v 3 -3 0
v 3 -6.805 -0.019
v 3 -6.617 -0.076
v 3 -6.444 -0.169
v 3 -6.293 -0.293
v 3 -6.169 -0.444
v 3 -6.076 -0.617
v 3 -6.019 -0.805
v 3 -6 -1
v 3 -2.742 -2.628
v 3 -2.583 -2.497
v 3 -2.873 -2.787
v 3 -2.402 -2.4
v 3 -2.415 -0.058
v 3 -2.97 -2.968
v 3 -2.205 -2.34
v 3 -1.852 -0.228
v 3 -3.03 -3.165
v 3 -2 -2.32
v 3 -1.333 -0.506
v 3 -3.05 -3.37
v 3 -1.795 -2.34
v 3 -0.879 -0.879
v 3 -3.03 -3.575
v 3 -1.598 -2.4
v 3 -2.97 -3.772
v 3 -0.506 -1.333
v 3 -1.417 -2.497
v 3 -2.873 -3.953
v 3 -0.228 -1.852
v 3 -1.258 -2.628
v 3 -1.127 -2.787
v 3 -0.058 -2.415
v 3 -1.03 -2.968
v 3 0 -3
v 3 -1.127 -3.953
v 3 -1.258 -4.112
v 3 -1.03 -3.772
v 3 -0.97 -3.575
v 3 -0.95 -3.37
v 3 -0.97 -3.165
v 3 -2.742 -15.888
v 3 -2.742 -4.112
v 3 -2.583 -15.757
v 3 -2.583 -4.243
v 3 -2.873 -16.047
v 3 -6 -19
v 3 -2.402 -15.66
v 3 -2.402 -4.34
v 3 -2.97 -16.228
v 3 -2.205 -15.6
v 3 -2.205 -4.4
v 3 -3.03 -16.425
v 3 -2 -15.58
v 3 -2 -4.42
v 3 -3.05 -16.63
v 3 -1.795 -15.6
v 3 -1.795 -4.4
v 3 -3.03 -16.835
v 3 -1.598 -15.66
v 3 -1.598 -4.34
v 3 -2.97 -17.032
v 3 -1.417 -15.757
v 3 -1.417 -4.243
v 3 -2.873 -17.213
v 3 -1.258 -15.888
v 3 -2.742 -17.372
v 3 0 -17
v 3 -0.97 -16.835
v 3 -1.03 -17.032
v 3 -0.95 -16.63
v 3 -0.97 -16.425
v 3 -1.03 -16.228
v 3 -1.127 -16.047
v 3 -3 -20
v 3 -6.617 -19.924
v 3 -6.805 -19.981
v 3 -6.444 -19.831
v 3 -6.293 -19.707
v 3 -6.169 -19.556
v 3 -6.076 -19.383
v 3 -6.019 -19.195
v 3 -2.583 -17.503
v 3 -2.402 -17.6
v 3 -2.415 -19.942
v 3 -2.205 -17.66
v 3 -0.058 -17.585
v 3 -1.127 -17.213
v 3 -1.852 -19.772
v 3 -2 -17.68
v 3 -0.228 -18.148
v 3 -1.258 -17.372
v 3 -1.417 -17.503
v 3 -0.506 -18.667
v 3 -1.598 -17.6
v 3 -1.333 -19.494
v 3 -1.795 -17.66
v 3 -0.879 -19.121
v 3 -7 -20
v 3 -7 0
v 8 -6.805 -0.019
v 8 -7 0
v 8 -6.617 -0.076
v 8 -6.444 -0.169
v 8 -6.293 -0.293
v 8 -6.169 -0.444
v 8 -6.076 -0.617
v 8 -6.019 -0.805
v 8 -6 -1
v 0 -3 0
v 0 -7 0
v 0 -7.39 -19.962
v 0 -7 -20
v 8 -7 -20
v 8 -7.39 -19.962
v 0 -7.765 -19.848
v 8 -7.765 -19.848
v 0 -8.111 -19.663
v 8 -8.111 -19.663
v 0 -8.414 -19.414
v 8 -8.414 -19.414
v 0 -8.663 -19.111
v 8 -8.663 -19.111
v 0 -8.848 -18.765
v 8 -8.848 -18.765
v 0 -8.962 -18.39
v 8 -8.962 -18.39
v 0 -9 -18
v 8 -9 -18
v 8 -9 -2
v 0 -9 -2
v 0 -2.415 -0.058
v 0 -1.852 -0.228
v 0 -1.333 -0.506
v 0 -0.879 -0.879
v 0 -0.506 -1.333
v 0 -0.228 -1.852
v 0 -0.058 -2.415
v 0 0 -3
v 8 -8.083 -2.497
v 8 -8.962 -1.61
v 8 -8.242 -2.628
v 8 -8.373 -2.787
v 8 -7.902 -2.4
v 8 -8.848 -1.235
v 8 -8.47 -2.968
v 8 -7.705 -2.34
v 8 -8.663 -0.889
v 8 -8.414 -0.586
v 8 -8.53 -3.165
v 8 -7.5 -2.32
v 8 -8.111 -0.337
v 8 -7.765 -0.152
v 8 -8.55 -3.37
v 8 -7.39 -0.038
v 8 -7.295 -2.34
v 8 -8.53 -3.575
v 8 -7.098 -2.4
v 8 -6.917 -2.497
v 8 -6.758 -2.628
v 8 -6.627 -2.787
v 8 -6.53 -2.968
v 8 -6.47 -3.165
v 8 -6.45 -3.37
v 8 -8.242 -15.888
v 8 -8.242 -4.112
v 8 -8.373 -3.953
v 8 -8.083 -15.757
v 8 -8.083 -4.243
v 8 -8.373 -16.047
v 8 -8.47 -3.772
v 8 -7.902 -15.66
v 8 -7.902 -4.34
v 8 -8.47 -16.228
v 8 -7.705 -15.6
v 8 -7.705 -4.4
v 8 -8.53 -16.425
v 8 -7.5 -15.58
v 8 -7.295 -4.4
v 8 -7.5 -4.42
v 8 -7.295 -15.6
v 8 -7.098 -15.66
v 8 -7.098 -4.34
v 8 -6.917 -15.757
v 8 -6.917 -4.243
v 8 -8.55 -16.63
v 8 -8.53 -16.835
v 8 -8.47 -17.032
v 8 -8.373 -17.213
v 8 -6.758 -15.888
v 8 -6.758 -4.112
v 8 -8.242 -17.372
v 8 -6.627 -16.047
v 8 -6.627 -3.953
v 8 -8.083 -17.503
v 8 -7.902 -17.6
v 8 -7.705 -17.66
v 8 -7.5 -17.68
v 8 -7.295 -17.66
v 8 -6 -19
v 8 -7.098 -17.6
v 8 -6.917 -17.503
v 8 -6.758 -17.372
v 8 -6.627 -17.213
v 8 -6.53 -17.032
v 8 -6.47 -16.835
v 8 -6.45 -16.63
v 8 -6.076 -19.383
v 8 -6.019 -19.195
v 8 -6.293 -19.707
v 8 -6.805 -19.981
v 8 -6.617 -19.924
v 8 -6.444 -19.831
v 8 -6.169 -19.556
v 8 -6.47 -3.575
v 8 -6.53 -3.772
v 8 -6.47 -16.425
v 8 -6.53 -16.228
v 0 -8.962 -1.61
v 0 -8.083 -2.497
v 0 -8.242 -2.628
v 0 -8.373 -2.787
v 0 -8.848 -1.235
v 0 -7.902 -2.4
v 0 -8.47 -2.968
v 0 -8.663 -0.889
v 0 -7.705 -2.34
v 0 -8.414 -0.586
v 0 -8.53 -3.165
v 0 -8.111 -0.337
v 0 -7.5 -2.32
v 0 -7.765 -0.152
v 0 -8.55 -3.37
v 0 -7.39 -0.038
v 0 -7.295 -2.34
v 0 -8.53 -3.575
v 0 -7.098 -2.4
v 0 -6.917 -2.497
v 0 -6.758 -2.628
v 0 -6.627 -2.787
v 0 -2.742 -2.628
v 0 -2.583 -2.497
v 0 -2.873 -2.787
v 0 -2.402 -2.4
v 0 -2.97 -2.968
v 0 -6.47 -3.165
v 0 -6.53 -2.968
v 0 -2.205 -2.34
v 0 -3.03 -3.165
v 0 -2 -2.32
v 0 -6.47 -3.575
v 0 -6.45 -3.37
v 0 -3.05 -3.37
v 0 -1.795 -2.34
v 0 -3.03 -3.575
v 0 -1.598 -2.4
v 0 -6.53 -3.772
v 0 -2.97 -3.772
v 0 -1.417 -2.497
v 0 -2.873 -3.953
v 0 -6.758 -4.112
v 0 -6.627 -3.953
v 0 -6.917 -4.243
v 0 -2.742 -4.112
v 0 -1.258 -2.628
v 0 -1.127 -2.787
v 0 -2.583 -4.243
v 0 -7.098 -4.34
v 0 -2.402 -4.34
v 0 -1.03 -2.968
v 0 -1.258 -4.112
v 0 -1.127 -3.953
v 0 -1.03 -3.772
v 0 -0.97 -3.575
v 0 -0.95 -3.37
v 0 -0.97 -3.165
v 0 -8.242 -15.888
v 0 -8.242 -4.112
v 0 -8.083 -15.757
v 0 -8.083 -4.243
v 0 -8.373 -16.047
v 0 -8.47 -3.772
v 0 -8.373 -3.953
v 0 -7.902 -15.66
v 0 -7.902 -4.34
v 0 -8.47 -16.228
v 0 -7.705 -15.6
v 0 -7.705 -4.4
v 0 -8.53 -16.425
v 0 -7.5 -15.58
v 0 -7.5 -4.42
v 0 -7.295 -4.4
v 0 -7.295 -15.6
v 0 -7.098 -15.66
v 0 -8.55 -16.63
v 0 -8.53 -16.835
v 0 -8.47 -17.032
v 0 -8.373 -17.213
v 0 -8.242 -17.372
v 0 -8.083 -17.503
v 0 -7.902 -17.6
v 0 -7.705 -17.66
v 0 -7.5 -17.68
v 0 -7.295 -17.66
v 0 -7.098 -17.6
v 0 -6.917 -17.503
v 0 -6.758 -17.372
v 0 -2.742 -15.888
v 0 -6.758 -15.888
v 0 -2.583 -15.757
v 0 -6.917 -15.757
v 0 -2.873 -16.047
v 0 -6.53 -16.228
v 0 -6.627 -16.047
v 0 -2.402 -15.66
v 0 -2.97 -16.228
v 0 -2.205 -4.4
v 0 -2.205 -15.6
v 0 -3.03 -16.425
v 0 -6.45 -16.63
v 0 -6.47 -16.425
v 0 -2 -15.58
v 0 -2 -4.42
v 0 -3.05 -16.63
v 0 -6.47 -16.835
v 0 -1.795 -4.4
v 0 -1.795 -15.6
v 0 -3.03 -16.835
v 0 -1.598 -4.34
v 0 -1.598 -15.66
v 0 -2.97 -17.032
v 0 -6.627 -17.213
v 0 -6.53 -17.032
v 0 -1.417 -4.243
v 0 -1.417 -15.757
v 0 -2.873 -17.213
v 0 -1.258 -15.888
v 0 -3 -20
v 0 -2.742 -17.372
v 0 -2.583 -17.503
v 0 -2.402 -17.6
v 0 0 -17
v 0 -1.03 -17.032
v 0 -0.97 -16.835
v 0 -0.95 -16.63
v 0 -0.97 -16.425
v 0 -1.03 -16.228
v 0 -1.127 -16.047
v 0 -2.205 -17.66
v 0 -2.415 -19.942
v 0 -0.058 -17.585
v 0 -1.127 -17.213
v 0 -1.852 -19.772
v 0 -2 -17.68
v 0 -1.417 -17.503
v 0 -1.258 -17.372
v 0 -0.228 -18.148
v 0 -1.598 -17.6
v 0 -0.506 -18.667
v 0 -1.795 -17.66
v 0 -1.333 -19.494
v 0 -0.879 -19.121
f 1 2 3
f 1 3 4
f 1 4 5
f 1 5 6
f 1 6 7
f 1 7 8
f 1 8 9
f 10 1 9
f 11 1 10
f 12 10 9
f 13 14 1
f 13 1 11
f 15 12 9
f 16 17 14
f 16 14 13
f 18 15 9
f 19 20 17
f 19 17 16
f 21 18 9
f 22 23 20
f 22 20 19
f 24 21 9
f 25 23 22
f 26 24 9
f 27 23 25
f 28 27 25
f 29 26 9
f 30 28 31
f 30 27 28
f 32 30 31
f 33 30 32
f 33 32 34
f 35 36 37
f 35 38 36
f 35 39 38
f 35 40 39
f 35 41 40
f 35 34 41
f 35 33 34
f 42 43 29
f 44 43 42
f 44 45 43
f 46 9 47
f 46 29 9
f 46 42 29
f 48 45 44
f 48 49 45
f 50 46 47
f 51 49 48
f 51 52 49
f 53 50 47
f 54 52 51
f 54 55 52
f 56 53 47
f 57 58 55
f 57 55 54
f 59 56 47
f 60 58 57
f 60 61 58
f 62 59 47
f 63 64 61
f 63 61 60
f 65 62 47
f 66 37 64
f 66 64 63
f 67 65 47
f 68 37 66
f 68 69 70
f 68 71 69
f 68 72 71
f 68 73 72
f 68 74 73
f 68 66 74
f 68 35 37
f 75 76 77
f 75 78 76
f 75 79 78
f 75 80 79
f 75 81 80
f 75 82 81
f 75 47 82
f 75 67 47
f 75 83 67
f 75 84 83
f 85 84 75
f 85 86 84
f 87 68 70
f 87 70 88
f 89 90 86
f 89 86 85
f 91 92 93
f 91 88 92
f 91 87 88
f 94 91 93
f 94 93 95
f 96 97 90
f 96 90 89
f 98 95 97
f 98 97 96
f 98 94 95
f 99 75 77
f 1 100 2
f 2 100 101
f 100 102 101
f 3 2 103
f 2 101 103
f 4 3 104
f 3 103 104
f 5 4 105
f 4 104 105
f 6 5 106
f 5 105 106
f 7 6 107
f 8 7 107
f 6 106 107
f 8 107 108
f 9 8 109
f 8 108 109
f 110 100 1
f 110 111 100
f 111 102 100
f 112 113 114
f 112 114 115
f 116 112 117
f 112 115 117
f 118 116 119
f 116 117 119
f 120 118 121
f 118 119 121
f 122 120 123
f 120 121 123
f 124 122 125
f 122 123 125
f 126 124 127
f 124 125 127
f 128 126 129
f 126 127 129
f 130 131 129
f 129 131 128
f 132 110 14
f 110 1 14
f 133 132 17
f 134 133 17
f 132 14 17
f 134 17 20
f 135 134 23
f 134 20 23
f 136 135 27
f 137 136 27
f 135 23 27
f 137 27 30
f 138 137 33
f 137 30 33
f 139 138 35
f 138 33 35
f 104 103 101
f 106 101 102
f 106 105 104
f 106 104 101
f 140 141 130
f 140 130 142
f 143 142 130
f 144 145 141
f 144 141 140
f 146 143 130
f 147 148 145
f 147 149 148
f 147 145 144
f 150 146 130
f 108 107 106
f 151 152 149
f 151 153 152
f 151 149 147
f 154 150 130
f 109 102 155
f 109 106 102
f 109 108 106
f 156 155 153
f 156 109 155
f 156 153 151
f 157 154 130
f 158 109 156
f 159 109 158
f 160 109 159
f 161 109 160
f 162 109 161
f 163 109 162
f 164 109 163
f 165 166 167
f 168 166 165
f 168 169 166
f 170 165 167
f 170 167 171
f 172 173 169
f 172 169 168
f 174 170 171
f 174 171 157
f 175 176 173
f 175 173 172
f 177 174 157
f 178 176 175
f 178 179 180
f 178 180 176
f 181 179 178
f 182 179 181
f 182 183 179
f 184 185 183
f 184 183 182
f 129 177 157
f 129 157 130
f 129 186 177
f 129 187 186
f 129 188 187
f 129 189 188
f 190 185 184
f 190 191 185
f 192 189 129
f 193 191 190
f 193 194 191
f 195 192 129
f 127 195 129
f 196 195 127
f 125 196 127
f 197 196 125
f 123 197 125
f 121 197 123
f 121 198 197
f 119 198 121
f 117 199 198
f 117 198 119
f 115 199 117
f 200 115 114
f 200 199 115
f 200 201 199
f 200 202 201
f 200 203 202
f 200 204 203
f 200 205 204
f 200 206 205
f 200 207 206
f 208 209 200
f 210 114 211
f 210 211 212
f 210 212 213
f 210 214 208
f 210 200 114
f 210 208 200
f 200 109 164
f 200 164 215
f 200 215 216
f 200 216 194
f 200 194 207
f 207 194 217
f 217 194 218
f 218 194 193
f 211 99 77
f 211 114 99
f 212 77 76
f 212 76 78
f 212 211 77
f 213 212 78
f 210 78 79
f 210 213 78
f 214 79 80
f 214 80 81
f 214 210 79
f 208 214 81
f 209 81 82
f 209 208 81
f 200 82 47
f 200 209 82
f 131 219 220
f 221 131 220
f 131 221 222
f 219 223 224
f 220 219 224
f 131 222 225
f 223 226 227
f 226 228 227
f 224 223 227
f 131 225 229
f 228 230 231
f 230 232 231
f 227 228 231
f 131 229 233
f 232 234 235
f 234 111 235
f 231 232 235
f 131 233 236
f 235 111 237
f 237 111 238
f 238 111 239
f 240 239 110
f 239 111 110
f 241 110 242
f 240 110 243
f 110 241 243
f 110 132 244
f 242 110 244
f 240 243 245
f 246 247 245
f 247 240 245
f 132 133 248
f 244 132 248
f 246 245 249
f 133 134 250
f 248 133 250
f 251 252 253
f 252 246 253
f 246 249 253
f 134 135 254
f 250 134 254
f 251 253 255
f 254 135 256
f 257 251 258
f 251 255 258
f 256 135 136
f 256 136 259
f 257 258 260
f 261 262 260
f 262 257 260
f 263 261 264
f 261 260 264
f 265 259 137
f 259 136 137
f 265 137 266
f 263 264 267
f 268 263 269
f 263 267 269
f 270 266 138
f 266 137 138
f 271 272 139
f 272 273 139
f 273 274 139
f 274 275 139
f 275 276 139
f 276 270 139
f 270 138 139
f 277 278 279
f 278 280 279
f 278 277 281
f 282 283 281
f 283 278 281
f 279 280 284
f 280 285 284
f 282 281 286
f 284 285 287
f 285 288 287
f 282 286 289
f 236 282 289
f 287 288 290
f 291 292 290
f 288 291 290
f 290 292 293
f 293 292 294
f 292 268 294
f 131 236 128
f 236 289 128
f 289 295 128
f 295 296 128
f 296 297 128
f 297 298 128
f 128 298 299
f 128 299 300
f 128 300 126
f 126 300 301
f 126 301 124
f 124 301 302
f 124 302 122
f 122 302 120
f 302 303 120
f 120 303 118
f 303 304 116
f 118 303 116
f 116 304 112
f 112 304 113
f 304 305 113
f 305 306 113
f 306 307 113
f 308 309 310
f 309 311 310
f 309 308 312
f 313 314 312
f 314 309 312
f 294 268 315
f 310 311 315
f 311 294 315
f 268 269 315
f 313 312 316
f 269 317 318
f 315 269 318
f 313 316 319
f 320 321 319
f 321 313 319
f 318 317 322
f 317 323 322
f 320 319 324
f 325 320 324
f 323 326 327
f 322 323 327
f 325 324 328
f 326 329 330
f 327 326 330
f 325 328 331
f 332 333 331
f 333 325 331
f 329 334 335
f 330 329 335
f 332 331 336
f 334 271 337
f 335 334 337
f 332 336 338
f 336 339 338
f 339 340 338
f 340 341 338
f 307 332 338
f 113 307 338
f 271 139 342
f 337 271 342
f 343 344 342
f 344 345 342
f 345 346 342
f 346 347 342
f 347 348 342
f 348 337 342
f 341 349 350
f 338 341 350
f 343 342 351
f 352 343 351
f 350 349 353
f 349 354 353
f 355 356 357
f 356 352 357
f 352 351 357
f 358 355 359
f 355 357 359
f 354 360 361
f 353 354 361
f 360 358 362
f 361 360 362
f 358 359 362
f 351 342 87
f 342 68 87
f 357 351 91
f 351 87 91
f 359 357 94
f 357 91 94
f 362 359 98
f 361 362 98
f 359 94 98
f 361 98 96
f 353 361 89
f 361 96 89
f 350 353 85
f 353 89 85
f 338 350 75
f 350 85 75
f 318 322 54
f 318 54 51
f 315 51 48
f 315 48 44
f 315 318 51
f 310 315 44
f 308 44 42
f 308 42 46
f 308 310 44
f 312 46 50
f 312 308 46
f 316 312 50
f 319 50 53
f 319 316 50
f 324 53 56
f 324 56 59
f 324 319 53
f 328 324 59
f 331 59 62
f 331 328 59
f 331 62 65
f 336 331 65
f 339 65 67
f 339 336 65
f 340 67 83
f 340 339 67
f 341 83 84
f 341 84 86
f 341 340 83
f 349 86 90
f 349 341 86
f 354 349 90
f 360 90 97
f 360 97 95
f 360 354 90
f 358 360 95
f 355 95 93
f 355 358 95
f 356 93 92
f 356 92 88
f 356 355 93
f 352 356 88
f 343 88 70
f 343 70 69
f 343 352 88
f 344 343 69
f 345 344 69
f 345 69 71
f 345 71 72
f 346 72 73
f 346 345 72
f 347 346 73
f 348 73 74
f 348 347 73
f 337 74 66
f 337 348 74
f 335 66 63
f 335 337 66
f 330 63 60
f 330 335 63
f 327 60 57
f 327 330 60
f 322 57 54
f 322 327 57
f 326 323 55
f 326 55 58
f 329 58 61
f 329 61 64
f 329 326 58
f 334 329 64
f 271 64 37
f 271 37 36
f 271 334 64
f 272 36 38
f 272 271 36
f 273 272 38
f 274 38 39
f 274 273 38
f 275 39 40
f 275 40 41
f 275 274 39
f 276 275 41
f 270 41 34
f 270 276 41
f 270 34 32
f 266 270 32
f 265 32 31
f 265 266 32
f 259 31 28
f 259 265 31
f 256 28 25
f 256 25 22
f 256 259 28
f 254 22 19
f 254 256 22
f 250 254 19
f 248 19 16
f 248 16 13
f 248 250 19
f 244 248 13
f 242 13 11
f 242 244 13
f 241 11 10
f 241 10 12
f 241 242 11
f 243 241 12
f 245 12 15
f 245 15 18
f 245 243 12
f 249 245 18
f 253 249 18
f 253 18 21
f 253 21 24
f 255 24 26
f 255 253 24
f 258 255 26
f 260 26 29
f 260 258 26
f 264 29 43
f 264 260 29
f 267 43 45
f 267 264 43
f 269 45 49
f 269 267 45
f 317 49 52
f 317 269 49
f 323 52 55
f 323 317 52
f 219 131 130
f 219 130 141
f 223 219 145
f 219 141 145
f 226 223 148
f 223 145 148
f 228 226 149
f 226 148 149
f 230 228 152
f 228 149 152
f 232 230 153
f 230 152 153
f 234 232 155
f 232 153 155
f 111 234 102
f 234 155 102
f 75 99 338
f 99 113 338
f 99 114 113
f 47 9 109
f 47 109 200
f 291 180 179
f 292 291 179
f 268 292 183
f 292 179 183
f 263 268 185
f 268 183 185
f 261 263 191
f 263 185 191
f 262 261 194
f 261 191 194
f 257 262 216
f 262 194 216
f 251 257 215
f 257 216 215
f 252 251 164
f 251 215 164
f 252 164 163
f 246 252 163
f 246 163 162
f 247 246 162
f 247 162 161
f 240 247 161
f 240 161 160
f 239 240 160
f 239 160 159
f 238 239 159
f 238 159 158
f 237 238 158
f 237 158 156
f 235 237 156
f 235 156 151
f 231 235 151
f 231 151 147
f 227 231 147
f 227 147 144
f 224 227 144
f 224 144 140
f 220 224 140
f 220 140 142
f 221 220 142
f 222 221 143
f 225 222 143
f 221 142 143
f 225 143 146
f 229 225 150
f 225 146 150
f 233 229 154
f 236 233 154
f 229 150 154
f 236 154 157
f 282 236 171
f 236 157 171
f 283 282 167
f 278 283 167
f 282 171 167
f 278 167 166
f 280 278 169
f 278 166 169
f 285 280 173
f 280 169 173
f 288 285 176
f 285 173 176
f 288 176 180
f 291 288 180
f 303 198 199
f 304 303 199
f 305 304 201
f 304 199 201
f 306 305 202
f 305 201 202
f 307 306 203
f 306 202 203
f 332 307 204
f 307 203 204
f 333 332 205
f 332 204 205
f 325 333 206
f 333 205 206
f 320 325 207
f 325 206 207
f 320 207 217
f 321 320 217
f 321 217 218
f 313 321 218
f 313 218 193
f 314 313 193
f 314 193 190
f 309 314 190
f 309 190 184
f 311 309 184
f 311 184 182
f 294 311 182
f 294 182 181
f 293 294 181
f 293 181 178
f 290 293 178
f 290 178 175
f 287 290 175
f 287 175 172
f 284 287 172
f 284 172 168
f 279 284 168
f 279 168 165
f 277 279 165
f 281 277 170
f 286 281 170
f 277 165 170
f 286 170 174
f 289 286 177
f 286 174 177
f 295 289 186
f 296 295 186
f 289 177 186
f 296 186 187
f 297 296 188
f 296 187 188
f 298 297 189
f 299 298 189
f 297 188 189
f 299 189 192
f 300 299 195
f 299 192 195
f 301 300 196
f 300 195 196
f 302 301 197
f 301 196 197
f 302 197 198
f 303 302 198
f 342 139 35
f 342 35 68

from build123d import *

# Parameters (mm, degrees)
SKETCH_1_W          = 20
SKETCH_1_H          = 9
SKETCH_1_R          = 1.05
EXTRUDE_1_DEPTH     = 3
SKETCH_2_W          = 20
SKETCH_2_H          = 3
EXTRUDE_2_DEPTH     = 5
SKETCH_3_R          = 1.05
CUT_EXTRUDE_1_DEPTH = 10
FILLET_1_R          = 3
FILLET_2_R          = 3
FILLET_3_R          = 2
FILLET_4_R          = 2
FILLET_7_R          = 1
FILLET_8_R          = 1


with BuildPart() as part:
    # 草图1 → 凸台-拉伸1 (new body)
    with BuildSketch(Plane(origin=(0, 0, 0), x_dir=(0, 0, -1), z_dir=(1, 0, 0))):
        with Locations((10, -4.5)):
            Rectangle(SKETCH_1_W, SKETCH_1_H)
        with Locations((3.37, -2)):
            Circle(SKETCH_1_R, mode=Mode.SUBTRACT)
        with Locations(Location((16.63, -2, 0), (0, 0, 180))):
            Circle(SKETCH_1_R, mode=Mode.SUBTRACT)
    extrude(amount=EXTRUDE_1_DEPTH)

    # 草图2 → 凸台-拉伸2 (add)
    with BuildSketch(Plane(origin=(3, 0, 0), x_dir=(0, 0, -1), z_dir=(1, 0, 0))):
        with Locations((10, -7.5)):
            Rectangle(SKETCH_2_W, SKETCH_2_H)
    extrude(amount=EXTRUDE_2_DEPTH)

    # 草图3 → 切除-拉伸1 (cut)
    with BuildSketch(Plane(origin=(8, 0, 0), x_dir=(0, 0, -1), z_dir=(1, 0, 0))):
        with Locations((3.37, -7.5)):
            Circle(SKETCH_3_R)
        with Locations((16.63, -7.5)):
            Circle(SKETCH_3_R)
    extrude(amount=-CUT_EXTRUDE_1_DEPTH, mode=Mode.SUBTRACT)

    # 圆角1
    fillet_1_edges = [part.edges().sort_by_distance(p)[0] for p in [
        (1.5, 0, 0),
    ]]
    fillet(fillet_1_edges, radius=FILLET_1_R)

    # 圆角2
    fillet_2_edges = [part.edges().sort_by_distance(p)[0] for p in [
        (1.5, 0, -20),
    ]]
    fillet(fillet_2_edges, radius=FILLET_2_R)

    # 圆角3
    fillet_3_edges = [part.edges().sort_by_distance(p)[0] for p in [
        (4, -9, -20),
    ]]
    fillet(fillet_3_edges, radius=FILLET_3_R)

    # 圆角4
    fillet_4_edges = [part.edges().sort_by_distance(p)[0] for p in [
        (4, -9, 0),
    ]]
    fillet(fillet_4_edges, radius=FILLET_4_R)

    # 圆角7
    fillet_7_edges = [part.edges().sort_by_distance(p)[0] for p in [
        (5.5, -6, 0),
    ]]
    fillet(fillet_7_edges, radius=FILLET_7_R - 0.0001)  # a hair under: the kernel refuses the full size

    # 圆角8
    fillet_8_edges = [part.edges().sort_by_distance(p)[0] for p in [
        (5.5, -6, -20),
    ]]
    fillet(fillet_8_edges, radius=FILLET_8_R - 0.0001)  # a hair under: the kernel refuses the full size


solid = part.part
